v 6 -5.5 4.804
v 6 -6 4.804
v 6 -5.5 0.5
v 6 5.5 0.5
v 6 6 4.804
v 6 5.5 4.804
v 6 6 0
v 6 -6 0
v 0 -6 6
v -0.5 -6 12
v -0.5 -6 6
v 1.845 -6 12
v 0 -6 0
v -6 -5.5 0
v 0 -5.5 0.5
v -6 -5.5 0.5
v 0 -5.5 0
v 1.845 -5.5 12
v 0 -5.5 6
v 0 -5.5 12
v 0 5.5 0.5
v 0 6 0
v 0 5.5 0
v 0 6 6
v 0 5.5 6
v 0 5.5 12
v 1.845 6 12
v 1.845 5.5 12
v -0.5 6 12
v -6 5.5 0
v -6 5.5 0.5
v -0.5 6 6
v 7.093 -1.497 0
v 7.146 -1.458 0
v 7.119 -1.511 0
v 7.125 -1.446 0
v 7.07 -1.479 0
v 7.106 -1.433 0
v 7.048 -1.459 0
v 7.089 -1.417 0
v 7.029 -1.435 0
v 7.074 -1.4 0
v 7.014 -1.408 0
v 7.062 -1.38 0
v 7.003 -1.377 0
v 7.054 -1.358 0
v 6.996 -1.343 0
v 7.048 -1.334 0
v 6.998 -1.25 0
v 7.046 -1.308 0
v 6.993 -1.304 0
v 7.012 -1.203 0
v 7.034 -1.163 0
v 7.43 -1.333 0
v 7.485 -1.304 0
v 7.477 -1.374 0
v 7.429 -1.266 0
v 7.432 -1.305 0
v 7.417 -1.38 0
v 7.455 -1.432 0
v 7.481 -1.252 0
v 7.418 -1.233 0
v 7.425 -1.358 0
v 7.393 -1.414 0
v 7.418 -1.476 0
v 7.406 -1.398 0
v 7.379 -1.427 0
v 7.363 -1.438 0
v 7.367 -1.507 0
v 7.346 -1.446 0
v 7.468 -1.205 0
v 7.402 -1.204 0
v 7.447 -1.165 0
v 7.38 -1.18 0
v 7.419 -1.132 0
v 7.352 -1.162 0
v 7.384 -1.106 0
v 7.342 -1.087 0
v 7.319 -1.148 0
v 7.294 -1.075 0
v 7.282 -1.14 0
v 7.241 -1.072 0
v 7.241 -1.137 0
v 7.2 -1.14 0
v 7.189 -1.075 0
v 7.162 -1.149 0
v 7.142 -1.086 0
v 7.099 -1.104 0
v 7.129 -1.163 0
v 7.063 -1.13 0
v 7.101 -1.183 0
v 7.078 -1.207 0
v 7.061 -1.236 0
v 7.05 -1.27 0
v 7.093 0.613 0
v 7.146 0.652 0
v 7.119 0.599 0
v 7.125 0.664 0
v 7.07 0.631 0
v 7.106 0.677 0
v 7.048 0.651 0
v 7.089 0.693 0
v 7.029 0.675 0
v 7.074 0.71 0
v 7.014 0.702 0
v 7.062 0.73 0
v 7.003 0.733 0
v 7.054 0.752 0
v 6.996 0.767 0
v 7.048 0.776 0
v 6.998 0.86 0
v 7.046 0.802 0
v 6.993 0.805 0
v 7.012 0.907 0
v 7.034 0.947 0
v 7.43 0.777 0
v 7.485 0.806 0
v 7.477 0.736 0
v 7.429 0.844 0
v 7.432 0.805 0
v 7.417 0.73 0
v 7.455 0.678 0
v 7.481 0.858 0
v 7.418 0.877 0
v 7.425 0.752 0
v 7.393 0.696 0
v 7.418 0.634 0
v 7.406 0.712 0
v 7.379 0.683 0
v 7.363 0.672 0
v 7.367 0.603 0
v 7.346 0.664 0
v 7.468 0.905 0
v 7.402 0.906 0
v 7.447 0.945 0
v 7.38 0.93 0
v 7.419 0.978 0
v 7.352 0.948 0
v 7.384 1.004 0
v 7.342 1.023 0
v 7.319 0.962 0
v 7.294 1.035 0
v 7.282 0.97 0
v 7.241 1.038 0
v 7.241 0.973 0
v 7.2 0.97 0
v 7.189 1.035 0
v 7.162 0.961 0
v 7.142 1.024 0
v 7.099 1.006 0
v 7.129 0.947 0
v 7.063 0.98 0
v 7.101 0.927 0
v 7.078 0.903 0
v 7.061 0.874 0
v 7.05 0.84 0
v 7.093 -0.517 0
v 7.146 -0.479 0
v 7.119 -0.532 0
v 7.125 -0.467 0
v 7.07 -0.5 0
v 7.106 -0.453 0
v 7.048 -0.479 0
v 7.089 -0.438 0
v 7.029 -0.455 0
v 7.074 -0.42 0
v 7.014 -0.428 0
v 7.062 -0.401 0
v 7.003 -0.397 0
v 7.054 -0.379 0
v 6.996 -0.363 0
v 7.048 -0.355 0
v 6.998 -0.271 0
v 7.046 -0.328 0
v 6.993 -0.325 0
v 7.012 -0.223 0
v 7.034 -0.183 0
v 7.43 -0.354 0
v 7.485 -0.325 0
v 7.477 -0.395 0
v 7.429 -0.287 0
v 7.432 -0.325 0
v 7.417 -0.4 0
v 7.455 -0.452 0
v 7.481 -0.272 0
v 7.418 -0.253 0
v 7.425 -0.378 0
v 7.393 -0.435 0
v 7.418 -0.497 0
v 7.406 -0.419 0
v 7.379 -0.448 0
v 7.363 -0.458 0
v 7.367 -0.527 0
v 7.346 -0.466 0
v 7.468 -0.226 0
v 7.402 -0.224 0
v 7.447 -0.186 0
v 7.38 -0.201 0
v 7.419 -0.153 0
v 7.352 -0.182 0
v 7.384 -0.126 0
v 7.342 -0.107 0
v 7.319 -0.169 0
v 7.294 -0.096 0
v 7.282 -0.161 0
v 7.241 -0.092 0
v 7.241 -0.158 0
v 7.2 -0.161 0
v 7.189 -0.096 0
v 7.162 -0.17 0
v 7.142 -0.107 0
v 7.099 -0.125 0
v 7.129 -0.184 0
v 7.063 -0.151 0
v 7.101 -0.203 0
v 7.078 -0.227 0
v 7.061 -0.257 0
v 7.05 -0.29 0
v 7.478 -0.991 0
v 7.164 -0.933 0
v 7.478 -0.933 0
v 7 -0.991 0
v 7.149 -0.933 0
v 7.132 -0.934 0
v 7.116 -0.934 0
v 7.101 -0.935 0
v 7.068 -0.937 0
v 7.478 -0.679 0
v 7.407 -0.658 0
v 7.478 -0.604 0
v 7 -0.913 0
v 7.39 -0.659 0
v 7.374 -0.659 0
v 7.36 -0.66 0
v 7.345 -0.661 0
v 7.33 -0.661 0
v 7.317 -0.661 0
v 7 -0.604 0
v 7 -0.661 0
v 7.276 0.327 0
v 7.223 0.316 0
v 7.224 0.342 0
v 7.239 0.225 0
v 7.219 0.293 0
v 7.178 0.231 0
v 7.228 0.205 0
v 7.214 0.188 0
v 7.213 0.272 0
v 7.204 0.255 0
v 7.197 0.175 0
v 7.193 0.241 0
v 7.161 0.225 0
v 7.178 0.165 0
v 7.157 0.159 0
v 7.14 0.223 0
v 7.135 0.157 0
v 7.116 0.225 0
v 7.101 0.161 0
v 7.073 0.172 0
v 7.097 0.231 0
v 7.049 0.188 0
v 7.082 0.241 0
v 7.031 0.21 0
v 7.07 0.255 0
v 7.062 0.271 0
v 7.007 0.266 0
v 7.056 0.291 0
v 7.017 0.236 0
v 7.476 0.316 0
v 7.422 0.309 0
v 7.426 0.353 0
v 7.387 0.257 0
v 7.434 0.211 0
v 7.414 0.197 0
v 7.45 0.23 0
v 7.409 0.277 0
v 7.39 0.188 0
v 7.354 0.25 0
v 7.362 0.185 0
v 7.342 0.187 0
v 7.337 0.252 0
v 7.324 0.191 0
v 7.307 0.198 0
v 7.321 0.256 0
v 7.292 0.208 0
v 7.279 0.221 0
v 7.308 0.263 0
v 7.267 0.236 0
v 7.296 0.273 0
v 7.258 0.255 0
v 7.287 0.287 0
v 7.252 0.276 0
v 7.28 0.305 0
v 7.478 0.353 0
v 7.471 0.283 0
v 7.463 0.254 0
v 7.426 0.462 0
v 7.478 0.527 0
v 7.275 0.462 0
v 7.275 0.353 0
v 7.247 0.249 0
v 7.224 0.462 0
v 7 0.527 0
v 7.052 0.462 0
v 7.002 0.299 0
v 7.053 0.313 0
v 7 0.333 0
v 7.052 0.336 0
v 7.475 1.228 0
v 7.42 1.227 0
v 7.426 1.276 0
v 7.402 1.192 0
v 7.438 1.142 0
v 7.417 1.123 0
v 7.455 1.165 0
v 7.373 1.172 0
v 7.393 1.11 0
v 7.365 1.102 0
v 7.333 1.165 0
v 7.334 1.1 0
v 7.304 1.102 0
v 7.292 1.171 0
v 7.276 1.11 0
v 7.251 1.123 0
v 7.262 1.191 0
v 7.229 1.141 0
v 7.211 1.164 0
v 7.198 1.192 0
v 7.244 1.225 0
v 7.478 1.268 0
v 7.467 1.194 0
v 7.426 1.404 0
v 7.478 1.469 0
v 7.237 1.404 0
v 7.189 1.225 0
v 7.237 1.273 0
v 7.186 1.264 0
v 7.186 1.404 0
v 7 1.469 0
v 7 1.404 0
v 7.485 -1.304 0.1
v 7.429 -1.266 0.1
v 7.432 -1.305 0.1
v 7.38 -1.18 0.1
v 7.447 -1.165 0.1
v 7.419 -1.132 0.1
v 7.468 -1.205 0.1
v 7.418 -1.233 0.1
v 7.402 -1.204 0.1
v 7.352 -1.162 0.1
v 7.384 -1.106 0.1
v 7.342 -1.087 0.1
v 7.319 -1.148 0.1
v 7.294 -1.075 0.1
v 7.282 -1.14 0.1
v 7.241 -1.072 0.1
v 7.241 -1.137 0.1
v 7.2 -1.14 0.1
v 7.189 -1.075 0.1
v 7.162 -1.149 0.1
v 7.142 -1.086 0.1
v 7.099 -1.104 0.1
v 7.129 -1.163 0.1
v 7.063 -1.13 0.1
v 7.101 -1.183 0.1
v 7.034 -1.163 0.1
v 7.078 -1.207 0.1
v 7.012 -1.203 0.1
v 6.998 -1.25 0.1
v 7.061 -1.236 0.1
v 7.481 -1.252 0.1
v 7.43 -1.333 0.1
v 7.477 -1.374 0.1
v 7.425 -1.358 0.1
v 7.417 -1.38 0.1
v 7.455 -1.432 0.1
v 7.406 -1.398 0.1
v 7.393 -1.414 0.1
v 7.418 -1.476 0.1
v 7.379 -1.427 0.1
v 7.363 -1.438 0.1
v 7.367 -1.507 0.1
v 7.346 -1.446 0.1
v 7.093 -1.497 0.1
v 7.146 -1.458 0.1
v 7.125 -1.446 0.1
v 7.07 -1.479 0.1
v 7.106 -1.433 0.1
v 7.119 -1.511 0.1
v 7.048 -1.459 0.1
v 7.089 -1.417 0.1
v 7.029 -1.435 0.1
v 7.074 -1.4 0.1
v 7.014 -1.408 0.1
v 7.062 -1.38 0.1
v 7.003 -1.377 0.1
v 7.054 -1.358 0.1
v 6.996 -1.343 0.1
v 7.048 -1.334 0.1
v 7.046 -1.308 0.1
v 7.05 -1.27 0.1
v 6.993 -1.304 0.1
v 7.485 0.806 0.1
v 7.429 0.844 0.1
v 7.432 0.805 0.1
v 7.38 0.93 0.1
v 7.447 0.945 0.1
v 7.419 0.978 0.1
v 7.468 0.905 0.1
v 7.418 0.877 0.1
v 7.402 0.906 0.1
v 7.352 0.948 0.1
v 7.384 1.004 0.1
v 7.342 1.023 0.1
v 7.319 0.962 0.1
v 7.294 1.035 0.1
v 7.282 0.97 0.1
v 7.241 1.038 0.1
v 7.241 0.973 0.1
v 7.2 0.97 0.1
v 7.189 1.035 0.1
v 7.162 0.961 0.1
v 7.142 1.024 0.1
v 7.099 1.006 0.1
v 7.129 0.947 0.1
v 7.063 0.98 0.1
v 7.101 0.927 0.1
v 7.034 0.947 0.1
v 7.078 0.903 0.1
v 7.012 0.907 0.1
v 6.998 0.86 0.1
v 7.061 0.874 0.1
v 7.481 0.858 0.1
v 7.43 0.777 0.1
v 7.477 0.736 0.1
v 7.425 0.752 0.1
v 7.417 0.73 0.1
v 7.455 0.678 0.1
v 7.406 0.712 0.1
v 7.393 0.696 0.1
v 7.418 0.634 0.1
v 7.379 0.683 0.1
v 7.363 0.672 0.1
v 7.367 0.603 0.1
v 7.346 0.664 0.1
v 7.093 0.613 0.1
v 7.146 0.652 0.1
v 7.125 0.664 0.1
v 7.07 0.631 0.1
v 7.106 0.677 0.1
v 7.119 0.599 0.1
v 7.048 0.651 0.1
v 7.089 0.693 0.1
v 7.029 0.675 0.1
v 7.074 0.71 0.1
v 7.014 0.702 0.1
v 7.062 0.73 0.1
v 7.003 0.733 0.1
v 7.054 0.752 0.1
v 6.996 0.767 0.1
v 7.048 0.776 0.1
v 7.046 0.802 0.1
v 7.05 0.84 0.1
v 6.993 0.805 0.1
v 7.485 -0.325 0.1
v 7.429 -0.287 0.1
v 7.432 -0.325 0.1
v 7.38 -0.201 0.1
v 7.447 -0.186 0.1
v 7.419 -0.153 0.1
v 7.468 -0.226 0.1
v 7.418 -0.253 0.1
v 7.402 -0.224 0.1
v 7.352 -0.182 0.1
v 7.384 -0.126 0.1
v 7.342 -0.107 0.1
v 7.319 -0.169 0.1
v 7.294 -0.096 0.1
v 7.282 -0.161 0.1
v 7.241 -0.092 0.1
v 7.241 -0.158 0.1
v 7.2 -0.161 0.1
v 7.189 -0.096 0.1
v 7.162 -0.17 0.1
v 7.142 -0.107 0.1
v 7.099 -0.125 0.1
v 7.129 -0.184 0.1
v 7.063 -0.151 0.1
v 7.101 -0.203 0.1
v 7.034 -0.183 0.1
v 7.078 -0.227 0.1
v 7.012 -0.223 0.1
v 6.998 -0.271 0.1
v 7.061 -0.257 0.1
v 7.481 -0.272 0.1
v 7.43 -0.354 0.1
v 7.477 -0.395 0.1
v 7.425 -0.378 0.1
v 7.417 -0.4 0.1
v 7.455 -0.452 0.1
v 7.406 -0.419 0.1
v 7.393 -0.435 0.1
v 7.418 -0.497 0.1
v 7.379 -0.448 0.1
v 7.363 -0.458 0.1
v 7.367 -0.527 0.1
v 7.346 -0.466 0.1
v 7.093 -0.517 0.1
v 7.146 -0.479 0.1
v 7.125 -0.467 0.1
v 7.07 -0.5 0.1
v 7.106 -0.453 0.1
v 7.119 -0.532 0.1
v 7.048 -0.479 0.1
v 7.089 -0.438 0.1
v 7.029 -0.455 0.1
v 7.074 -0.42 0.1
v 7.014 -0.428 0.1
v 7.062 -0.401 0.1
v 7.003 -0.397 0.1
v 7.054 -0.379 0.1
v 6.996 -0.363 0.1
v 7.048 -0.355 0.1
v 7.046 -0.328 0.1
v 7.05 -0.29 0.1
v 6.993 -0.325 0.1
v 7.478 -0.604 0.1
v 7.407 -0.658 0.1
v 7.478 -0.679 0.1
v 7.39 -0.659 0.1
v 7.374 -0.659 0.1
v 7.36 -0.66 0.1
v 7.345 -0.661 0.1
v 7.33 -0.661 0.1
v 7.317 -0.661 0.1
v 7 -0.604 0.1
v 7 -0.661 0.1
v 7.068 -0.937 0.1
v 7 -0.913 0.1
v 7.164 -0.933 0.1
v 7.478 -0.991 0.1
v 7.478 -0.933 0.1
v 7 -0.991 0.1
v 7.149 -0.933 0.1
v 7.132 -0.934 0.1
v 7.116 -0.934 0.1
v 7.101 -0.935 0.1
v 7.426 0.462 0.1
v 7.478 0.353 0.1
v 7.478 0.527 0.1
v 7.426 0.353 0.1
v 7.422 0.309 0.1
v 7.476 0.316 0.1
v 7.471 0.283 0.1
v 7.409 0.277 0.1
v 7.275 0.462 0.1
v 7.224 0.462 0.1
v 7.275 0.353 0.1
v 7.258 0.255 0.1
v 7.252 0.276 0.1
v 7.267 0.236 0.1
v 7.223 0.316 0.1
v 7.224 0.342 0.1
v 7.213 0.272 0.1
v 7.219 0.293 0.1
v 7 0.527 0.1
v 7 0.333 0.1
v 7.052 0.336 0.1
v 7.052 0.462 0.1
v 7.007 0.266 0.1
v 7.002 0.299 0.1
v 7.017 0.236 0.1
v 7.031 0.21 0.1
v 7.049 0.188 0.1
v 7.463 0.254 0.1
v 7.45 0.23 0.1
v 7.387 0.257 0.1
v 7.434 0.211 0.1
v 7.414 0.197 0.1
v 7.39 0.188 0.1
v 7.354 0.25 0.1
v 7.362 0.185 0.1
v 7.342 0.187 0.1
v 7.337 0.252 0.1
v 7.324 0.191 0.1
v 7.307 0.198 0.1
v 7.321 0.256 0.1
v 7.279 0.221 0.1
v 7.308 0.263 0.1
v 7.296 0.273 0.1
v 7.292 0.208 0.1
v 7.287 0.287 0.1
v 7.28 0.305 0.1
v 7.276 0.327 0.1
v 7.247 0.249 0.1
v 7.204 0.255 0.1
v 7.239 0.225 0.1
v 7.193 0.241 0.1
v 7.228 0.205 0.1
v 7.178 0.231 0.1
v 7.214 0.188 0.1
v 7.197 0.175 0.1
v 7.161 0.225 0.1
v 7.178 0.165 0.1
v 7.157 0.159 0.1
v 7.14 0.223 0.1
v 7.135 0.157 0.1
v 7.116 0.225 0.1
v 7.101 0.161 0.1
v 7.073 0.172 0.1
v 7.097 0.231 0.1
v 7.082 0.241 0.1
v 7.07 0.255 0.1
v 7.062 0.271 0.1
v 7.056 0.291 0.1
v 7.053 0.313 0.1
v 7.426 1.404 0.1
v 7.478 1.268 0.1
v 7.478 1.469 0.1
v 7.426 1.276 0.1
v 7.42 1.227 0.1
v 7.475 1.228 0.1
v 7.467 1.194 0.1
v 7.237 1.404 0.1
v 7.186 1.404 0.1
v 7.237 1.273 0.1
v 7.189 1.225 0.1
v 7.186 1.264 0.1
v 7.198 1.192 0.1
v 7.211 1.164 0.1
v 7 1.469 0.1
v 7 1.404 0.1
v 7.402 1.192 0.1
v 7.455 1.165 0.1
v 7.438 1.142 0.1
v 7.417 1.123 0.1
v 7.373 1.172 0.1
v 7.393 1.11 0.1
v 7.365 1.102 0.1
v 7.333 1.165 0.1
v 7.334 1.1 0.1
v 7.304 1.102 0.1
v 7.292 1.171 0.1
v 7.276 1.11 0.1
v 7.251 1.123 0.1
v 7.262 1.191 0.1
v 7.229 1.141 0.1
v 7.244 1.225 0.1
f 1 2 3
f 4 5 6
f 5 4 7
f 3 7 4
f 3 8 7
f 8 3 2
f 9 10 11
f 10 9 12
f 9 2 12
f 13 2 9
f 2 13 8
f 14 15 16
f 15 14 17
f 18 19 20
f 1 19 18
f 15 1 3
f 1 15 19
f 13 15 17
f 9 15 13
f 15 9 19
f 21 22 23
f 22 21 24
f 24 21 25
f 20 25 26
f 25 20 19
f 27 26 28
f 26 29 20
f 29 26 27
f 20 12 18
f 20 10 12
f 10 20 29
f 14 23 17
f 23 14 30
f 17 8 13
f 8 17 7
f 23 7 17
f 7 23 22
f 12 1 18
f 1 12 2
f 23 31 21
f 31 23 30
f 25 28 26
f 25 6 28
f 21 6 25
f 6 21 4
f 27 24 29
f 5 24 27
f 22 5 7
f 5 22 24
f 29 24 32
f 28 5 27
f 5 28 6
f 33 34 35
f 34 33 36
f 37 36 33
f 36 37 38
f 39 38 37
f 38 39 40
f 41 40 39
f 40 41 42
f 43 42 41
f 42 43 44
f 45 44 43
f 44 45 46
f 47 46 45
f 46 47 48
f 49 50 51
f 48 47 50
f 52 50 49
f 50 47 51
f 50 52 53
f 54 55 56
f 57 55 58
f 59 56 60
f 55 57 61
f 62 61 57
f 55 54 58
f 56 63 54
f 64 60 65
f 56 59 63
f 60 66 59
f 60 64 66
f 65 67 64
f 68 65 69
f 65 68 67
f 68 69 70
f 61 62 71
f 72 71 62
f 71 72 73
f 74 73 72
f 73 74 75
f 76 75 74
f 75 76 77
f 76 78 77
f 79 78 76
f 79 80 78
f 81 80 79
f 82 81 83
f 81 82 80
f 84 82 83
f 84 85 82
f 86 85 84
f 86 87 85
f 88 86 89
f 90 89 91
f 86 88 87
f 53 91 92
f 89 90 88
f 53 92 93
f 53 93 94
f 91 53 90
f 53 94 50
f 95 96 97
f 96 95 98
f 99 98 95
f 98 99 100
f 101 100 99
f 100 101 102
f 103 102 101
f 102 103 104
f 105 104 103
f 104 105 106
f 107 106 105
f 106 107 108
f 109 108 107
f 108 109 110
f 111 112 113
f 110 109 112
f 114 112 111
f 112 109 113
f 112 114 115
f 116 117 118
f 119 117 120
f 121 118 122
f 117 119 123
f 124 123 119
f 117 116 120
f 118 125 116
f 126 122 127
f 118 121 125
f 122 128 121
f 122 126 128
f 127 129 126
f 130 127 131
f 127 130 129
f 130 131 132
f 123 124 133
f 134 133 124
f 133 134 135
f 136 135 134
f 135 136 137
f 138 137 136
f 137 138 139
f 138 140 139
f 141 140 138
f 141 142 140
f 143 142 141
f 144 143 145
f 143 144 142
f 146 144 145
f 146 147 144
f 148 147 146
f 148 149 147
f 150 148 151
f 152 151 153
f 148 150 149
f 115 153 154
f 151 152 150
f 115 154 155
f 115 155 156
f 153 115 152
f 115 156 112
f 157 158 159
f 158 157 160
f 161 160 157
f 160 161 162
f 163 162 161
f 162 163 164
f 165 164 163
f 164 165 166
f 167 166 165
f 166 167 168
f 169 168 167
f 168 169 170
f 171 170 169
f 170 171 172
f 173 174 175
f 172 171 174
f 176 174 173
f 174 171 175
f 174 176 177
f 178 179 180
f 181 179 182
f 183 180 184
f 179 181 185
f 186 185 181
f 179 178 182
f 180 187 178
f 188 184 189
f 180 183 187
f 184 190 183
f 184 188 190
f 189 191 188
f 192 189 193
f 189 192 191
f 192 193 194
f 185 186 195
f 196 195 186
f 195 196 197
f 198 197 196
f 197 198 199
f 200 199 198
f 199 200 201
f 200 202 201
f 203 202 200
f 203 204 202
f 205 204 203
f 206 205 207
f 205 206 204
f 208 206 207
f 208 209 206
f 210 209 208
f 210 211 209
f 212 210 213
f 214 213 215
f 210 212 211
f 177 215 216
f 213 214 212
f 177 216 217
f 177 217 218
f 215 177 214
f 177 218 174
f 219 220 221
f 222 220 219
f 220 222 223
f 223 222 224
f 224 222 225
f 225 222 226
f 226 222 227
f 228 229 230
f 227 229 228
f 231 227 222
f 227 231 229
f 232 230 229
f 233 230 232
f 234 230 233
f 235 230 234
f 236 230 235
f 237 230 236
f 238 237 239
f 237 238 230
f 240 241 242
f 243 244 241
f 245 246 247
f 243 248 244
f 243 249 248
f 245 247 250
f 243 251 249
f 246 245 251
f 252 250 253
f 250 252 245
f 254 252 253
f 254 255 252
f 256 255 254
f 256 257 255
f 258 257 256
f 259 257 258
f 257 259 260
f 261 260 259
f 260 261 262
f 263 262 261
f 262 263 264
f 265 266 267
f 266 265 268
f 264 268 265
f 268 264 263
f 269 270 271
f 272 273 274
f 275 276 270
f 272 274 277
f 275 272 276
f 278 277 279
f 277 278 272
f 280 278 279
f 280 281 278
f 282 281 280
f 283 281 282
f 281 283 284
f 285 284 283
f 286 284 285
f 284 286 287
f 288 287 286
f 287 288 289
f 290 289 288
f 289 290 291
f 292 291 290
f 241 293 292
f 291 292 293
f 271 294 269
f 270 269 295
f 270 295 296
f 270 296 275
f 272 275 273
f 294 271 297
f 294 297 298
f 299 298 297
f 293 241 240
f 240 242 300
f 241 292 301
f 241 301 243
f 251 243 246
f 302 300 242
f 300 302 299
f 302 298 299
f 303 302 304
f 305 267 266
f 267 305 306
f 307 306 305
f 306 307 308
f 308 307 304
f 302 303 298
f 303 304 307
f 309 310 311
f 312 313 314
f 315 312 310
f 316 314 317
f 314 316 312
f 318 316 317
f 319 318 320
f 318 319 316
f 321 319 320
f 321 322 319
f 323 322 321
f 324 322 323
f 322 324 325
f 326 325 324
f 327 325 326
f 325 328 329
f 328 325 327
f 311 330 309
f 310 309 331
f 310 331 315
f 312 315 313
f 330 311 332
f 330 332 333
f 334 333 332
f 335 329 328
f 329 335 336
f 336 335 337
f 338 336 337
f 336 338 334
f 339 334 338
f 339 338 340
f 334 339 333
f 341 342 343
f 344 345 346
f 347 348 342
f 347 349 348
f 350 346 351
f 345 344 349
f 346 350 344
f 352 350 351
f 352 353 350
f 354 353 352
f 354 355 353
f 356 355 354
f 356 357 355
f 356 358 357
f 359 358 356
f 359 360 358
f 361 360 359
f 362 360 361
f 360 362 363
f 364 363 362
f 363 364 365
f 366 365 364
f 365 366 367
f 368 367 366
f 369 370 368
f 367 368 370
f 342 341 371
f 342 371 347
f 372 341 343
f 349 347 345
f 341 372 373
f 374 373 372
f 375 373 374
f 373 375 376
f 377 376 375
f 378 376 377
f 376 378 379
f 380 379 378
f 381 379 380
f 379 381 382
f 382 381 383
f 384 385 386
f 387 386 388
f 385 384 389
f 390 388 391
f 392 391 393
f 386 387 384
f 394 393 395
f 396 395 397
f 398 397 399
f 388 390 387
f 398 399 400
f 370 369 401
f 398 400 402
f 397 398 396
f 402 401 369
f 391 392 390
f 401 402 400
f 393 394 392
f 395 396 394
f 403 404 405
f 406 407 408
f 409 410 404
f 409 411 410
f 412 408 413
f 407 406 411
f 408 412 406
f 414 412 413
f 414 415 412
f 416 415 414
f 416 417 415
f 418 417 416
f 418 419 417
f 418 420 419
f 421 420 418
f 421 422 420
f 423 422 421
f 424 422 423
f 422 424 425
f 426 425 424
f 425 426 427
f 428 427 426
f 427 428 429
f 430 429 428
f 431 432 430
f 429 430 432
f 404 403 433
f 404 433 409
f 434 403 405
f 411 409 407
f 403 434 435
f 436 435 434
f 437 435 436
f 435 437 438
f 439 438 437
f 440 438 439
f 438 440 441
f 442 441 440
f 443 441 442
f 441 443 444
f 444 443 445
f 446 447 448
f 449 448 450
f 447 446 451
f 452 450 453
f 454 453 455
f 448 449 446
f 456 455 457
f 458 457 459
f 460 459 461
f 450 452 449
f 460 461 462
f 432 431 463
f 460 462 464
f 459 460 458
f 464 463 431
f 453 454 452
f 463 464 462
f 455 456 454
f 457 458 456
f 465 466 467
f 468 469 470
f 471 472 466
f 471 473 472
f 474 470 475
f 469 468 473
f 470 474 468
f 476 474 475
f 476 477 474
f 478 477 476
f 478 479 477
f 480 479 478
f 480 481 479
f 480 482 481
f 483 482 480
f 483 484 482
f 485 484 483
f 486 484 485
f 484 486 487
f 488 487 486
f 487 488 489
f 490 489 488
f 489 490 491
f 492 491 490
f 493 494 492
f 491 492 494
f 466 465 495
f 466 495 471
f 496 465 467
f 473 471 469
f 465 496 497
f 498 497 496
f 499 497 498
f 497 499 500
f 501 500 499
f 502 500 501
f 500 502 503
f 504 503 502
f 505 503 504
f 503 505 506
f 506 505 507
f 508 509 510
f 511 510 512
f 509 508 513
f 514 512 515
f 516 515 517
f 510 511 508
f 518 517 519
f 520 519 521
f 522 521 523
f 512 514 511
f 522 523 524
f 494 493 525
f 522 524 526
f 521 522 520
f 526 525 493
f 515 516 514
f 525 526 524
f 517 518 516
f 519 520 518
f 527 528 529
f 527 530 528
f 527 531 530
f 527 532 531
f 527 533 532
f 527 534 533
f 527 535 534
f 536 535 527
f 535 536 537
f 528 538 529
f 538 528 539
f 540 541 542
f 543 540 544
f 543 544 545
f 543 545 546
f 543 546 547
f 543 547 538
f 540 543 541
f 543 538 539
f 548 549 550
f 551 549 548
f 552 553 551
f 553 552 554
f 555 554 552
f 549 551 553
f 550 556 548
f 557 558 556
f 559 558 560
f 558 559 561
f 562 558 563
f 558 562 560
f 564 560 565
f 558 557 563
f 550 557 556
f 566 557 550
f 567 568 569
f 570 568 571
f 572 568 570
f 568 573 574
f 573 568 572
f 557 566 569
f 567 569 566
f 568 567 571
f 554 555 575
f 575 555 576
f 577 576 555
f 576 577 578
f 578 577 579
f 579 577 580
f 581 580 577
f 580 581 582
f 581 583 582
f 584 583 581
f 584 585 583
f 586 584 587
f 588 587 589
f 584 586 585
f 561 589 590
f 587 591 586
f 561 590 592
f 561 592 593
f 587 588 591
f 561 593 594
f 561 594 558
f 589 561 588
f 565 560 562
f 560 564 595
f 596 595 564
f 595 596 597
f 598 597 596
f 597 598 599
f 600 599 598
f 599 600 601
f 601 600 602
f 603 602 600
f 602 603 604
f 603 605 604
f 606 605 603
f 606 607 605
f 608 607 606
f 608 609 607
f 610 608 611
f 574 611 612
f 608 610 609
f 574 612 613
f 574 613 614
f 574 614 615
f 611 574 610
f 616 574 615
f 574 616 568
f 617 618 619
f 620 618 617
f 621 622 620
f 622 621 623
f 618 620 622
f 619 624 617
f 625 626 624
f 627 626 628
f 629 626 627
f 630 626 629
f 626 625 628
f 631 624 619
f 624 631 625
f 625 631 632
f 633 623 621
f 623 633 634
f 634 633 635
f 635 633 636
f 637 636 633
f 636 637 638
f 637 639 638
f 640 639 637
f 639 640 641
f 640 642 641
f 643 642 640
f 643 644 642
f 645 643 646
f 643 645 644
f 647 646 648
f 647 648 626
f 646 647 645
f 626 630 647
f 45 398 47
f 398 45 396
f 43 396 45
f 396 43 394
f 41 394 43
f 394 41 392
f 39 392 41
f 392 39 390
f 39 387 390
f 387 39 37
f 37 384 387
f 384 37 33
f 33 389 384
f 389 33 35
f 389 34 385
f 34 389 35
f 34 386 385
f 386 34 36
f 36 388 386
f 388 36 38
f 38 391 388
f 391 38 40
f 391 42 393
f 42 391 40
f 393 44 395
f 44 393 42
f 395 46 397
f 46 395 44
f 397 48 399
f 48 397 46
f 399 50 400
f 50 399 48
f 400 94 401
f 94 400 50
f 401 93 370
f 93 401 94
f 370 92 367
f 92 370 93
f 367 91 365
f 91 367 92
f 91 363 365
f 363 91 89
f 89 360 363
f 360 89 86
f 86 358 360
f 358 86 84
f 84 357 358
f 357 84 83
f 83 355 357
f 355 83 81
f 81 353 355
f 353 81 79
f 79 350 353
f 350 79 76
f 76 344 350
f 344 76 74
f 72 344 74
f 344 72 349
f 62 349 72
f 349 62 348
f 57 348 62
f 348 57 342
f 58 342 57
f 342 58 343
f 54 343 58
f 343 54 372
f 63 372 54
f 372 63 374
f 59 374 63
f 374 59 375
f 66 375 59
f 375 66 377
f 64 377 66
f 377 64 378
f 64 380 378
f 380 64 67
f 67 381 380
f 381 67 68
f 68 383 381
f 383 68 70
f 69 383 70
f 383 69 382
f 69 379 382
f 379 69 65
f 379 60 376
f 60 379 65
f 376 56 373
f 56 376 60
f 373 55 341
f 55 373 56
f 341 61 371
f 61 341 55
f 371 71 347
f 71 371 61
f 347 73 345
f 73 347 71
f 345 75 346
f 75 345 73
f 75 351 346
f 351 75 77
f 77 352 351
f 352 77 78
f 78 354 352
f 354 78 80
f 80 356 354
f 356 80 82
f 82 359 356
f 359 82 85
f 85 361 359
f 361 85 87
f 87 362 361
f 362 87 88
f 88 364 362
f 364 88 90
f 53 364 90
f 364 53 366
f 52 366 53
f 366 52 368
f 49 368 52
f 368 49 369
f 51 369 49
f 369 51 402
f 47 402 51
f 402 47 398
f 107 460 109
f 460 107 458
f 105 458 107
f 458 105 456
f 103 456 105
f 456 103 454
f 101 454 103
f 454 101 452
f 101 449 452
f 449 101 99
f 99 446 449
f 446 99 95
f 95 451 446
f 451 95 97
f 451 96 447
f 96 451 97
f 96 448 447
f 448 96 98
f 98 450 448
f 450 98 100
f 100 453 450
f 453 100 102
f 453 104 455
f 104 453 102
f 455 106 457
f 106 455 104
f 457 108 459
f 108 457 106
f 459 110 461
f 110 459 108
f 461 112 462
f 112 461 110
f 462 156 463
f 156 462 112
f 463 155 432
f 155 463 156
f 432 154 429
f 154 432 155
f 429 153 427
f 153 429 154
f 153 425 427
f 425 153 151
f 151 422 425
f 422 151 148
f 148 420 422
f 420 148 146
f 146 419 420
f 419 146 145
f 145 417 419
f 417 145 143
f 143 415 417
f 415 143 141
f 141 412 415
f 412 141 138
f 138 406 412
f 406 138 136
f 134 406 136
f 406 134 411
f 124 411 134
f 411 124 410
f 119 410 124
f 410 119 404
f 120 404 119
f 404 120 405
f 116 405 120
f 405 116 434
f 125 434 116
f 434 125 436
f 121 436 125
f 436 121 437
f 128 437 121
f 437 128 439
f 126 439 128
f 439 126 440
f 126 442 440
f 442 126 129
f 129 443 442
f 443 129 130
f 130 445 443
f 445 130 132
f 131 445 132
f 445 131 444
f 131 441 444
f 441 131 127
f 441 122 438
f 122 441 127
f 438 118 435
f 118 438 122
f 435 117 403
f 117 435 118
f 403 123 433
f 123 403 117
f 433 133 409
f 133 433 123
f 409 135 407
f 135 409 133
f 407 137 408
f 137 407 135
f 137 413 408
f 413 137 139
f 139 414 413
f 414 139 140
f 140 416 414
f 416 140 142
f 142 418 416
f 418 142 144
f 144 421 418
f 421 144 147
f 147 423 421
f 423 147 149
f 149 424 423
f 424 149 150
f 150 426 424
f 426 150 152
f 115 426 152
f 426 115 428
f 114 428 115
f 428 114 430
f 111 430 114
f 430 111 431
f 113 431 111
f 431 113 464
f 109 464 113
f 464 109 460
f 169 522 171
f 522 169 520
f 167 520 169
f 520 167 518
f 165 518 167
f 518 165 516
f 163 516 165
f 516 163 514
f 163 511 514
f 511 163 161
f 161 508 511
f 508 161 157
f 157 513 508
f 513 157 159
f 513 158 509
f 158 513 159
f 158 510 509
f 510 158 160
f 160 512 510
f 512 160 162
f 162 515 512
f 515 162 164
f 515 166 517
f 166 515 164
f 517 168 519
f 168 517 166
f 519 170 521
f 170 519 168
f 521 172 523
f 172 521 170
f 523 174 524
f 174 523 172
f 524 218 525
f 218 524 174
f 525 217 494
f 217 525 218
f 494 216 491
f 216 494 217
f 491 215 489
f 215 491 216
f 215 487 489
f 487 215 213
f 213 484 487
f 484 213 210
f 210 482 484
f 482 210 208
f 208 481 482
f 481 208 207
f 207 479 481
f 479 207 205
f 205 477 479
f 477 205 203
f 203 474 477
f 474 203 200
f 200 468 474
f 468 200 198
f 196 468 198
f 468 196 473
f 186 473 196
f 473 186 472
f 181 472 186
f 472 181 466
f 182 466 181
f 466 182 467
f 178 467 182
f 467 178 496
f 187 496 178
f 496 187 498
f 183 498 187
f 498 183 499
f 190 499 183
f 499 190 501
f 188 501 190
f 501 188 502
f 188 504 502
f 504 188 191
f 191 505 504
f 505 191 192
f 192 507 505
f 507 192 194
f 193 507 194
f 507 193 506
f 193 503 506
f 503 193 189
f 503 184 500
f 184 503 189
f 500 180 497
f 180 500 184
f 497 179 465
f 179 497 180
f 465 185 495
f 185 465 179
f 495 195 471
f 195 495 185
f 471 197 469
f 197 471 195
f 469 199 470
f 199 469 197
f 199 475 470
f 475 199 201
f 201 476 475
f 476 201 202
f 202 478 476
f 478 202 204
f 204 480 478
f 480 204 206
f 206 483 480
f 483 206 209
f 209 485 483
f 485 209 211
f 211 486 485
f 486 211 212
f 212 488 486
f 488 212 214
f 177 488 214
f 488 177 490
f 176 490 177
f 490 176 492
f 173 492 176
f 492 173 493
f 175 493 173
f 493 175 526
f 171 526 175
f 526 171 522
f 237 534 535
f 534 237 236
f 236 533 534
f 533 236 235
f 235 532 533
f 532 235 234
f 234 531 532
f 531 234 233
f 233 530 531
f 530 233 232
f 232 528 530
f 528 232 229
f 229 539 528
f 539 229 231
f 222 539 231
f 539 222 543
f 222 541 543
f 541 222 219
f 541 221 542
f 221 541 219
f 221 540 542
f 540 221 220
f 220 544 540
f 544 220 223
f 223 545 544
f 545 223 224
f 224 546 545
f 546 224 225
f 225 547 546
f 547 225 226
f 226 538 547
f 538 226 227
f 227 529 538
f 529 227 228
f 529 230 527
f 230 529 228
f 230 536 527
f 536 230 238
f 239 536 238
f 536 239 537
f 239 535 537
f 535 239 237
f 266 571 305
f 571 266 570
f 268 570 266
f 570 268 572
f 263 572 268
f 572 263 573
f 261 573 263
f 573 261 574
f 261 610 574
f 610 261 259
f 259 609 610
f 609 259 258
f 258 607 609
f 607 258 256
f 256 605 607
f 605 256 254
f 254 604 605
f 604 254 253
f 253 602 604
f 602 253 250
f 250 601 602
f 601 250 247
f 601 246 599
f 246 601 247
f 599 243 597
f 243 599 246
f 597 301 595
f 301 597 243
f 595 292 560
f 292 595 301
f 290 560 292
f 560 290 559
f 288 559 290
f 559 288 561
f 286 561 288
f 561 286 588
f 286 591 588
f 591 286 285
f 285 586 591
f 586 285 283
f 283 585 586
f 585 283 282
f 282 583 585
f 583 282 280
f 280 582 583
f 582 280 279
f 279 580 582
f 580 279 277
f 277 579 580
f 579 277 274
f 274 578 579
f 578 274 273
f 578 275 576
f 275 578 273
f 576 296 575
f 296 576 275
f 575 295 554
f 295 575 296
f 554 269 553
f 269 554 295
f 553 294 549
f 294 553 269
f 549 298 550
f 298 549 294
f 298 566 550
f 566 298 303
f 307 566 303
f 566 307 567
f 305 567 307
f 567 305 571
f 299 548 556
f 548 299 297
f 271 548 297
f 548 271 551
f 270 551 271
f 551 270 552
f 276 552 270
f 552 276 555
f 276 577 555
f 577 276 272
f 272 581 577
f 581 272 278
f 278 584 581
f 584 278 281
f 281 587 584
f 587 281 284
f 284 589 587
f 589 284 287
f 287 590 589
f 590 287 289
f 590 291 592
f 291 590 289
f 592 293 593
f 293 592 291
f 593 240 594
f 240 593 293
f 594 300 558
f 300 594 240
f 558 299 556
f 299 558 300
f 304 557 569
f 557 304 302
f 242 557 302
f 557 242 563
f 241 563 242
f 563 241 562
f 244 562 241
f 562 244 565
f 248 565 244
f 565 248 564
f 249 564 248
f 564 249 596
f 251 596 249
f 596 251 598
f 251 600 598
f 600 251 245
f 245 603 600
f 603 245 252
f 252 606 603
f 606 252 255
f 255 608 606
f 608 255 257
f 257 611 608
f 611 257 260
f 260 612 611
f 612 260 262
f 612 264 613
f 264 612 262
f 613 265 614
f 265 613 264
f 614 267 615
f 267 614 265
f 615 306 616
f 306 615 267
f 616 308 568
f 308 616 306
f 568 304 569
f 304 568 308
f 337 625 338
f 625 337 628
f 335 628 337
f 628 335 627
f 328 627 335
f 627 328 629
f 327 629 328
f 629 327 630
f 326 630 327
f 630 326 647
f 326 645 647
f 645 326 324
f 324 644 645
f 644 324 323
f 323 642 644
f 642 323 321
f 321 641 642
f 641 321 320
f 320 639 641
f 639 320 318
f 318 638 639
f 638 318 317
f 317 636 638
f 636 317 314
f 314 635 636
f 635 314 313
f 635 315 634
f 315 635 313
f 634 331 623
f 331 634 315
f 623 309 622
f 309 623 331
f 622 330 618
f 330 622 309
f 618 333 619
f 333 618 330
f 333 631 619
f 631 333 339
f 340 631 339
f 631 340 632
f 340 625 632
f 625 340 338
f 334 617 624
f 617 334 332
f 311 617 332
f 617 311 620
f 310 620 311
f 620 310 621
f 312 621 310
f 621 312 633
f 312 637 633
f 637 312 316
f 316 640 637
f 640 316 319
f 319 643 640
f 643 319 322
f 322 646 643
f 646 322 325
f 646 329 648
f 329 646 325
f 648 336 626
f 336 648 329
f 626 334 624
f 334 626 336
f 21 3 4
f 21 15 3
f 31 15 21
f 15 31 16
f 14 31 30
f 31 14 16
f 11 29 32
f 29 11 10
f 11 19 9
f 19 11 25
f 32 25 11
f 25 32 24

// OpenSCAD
// file: base.scad
function base_width() = 11;
function base_depth() = 12;
function base_thick() = 1/2;

module base(){
    color( [1, 1, 1, 1]) //white HDPE
    {
        translate([0,0,1/4])
        cube(size = [base_depth(),base_width(),base_thick()], center = true);
    }
}
base();
// file: side.scad
function side_width() = 1/2;

module side()
{
    color( [1, 1, 1, 1]) //white HDPE
    {  translate([3,6,1/4])
        difference()
        {
            cube(size = [6,12,side_width()], center = true);
            rotate([0,0,30]) translate([8,0,0]) 
                cube(size = [12,12,side_width() + .1], center = true);
            
        }
    }
}
side();
// file: backboard.scad
module backboard(){
    color([1,1,1])
    translate([0,3,1/4]) cube([12,6,1/2],center=true);
}
translate([0,-3,0]) backboard();
// file: table.scad
module table(){
    color( [1, 1, 1, 1]) //white HDPE
    {
        translate([0,0,1/8])
        cube(size = [10,10,1/4], center = true);
    }
}
table();
// file: slide_static.scad
module slide_dynamic(){
    //#cube([12,1+13/16,1/2],center=true);
    translate([0,0,1/4]) scale([.04,.04,.04]){
        difference(){
            import("drawer_slide.stl", convexity=6);
            union(){
                //#translate([140,0,0]) cube([20,100,100],center=true);
                translate([-150,0,0]) cube([300,43,8], center=true);
                translate([-250,0,5]) cube([500,36,18], center=true);
            }
        }
    }
}
slide_dynamic();
// file: slide_dynamic.scad
module slide_dynamic(){
    translate([0,0,9/32]) scale(.04,.04,.04) rotate([0,180,0]) translate([305,0,0]){
        difference(){
            import("drawer_slide.stl", convexity=6);
            union(){
                translate([-154.7,-50,-50]) cube(size=[1000,100,100]);
                translate([-450,-9,-4.4]) cube(size=[1000,18,10]);
                translate([-450,-20,-10]) cube(size=[1000,40,10]);
                translate([-1000,-14.8,2.8]) rotate([0,90,0]) cylinder(r=3.5,h=1000);
                translate([-1000,14.8,2.8]) rotate([0,90,0]) cylinder(r=3.5,h=1000);
            }
        }
    }
}
slide_dynamic();
// main file
use <slide_dynamic.scad>;
use <slide_static.scad>;
use <table.scad>;
use <backboard.scad>;
use <side.scad>;
use <base.scad>;

base_width = base_width();
side_width = side_width();
base_depth = base_depth();

module pcbcnc(){
    translate([7,0,0]) rotate([0,0,-90]) etext("PCB CNC");
    base();
    translate([0,-base_width/2,0]) rotate([90,0,0]) side();
    translate([0,base_width/2 + side_width,0]) rotate([90,0,0]) side();
    translate([0,0,6]) rotate([90,0,-90]) backboard();
}
module etext(text){
    color([0,0,0])
    linear_extrude(height=.1) text(text, halign="center", size=.5);
}
pcbcnc();
